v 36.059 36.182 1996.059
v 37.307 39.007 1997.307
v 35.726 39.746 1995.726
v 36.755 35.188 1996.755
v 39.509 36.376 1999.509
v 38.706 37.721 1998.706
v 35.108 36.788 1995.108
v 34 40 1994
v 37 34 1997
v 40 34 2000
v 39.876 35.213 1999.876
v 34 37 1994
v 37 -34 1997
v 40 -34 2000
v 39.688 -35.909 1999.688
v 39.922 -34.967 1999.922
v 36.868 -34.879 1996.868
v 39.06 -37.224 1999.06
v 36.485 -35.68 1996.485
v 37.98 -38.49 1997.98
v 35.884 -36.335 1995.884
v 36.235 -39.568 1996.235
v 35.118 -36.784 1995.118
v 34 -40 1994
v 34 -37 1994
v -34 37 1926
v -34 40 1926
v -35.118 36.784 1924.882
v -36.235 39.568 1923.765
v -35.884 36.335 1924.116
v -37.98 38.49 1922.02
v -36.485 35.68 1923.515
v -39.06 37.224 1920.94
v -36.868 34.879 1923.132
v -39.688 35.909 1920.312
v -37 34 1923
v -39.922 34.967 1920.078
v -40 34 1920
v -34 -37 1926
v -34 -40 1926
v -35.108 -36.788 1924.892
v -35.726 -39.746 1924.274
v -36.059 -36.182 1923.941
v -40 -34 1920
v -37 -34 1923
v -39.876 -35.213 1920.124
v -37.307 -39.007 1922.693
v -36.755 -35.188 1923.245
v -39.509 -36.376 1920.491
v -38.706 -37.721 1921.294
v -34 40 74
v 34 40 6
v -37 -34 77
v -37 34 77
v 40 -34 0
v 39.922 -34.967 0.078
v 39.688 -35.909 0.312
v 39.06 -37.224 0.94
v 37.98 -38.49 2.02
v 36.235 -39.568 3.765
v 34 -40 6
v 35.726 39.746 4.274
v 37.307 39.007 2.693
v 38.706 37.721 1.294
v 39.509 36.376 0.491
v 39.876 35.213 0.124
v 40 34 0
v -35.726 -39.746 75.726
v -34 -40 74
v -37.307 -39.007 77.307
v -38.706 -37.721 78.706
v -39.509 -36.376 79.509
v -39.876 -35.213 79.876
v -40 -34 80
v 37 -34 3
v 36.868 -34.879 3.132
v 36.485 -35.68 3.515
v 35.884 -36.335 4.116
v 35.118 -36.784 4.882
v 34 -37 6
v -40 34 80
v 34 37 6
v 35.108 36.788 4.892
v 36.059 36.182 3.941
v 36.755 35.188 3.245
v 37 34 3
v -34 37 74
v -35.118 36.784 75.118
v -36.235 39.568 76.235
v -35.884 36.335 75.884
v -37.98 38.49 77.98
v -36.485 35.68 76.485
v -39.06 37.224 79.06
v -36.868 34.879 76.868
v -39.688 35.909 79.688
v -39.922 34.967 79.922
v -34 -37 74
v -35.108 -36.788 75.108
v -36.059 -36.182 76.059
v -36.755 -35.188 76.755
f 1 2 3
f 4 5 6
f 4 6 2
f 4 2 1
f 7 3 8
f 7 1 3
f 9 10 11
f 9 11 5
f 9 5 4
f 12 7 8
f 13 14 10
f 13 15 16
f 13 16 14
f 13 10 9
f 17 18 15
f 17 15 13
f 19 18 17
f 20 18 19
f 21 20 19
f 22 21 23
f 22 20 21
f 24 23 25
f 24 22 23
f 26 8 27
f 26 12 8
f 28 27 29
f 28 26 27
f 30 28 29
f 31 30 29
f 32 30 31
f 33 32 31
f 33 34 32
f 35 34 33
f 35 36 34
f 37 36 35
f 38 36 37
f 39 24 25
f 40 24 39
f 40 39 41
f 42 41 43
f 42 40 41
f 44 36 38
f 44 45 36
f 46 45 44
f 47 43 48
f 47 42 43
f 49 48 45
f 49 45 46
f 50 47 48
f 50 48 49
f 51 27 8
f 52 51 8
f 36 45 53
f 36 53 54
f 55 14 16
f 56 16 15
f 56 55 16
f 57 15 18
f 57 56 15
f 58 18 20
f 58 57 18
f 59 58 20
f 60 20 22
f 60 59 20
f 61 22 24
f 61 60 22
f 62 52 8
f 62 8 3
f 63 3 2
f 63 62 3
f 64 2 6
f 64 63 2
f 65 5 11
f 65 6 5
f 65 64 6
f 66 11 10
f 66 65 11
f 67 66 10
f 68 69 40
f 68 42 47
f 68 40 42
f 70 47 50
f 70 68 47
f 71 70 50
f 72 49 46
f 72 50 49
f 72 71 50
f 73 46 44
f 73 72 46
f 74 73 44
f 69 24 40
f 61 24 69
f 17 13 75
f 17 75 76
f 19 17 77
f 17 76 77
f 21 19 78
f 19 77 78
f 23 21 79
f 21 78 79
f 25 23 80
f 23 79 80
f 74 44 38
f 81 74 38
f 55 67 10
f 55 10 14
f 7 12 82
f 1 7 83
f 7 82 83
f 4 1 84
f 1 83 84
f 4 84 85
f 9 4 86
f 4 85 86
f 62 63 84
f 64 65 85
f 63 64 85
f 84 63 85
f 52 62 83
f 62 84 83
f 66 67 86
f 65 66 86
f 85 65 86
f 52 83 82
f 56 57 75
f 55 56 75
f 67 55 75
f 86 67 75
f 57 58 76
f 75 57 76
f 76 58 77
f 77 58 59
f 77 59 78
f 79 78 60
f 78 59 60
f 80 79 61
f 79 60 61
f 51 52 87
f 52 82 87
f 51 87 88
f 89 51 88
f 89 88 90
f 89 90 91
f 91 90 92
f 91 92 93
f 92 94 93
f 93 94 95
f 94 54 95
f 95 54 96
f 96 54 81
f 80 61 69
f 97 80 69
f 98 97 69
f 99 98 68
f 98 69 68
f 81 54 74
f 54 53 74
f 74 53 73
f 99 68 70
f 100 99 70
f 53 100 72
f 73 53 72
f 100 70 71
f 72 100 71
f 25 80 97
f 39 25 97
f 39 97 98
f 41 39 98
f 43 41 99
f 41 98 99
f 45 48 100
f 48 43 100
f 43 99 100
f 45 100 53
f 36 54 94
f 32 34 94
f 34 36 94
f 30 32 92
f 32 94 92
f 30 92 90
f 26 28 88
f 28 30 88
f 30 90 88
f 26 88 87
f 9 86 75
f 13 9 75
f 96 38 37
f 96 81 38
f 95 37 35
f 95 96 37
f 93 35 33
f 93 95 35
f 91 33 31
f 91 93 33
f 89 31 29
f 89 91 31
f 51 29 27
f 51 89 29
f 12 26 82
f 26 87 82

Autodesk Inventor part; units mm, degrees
ref_plane "YZ Plane" through (0, 0, 0) normal (1, 0, 0) x (0, 1, 0)
ref_plane "Start Plane" through (0, 0, 0) normal (0, 0, 1) x (1, 0, 0)
ref_plane "End Plane" through (0, 0, 2000) normal (0, 0, 1) x (1, 0, 0)
sketch "Sketch" plane through (0, 0, 0) normal (0, 0, 1) x (1, 0, 0)
  line L0 (-40, -34) -> (-40, 34)
  line L1 (-34, 40) -> (34, 40)
  line L2 (40, 34) -> (40, -34)
  line L3 (34, -40) -> (-34, -40)
  arc A0 (-40, -34) -> (-34, -40) centre (-34, -34) ccw
  arc A1 (40, 34) -> (34, 40) centre (34, 34) ccw
  arc A2 (-34, 40) -> (-40, 34) centre (-34, 34) ccw
  arc A3 (34, -40) -> (40, -34) centre (34, -34) ccw
  arc A4 (-34, 37) -> (-37, 34) centre (-34, 34) ccw
  line L4 (-34, 37) -> (34, 37)
  arc A5 (37, 34) -> (34, 37) centre (34, 34) ccw
  line L5 (37, 34) -> (37, -34)
  arc A6 (34, -37) -> (37, -34) centre (34, -34) ccw
  line L6 (34, -37) -> (-34, -37)
  arc A7 (-37, -34) -> (-34, -37) centre (-34, -34) ccw
  line L7 (-37, -34) -> (-37, 34)
  line L8 (0, 57.7397) -> (0, -57.7397) construction
  line L9 (-57.7397, 0) -> (57.7397, 0) construction
  dimension "d7" = 6
  dimension "d9" = 80
  dimension "d11" = 80
  dimension "d12" = 3
  dimension "d15" = 40
  dimension "d16" = 40
extrude "Body" add sketch "Sketch" along normal up to surface (2000 mm away) from surface at 0
sketch "Sketch3" plane through (0, 0, 0) normal (0, 0, 1) x (1, 0, 0)
  line L0 (0, 0) -> (10, 0)
ref_plane "Work Plane3" through (0, 0, 0) normal (0, -1, 0) x (1, 0, 0)
sketch "Sketch5" plane through (0, 0, 0) normal (0, 1, 0) x (-1, 0, 0)
  line L0 (40, 0) -> (40, 2000) projected
  line L1 (34, 0) -> (40, 0) projected
  line L2 (34, 0) -> (-34, 0) projected
  line L3 (-40, 0) -> (-34, 0) projected
  line L4 (-40, 0) -> (-40, 2000) projected
  line L5 (-40, 2000) -> (-34, 2000) projected
  line L6 (34, 2000) -> (-34, 2000) projected
  line L7 (34, 2000) -> (40, 2000) projected
  line L8 (-40, 0) -> (40, 80)
  line L9 (-40, 2000) -> (40, 1920)
  point P0 (0, 0)
  dimension "d19" = 45
  dimension "d20" = 45
extrude "Extrusion2" cut sketch "Sketch5" along normal through all both and the other way through all contours L1 L2 L3 L8 L0 | L9 L5 L6 L7 L0
sketch "Sketch4" plane through (0, 0, 0) normal (0, -1, 0) x (1, 0, 0)
  line L0 (-2, 0) -> (12, 0) projected
  line L1 (-2, 2000) -> (12, 2000) projected
  dimension "d18" = 2000
equation "\"d7\" = G_IR"
equation "\"d9\" = G_W"
equation "\"d11\" = G_H"
equation "\"d12\" = G_T"
equation "\"d15\" = 0.5 * d9"
equation "\"d16\" = 0.5 * d11"
equation "\"d3\" = G_L"
equation "\"d20\" = d19"
equation "\"G_W\" = 80"
equation "\"G_H\" = 80"
equation "\"G_T\" = 3"
equation "\"G_IR\" = 6"
equation "\"G_L\" = d18"
equation "\"G_OFFSET_START\" = 0"
equation "\"G_OFFSET_END\" = 0"
properties part number "ISO 4019 - 80x80x3 - 2000" material "Steel, Mild"
